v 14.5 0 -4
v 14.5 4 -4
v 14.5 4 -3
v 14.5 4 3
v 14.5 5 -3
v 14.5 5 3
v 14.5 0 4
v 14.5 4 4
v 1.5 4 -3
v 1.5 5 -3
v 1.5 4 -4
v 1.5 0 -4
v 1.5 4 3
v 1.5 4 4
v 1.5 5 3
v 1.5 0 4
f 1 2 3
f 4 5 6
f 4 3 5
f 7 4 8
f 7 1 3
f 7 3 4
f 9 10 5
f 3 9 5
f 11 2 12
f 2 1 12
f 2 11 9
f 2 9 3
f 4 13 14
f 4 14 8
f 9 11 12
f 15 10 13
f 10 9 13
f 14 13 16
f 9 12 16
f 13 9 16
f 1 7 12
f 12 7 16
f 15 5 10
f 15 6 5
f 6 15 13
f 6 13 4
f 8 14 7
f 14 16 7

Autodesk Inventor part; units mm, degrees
ref_plane "YZ Plane" through (0, 0, 0) normal (1, 0, 0) x (0, 1, 0)
ref_plane "XZ Plane" through (0, 0, 0) normal (0, 1, 0) x (-1, 0, 0)
ref_plane "XY Plane" through (0, 0, 0) normal (0, 0, 1) x (1, 0, 0)
sketch "Sketch1" plane through (0, 0, 0) normal (0, 1, 0) x (-1, 0, 0)
  line L0 (0, 4) -> (-20, 4)
  line L1 (-20, 4) -> (-20, -4)
  line L2 (-20, -4) -> (0, -4)
  circle A0 centre (-20, 0) radius 4
  circle A1 centre (-20, 0) radius 2.5
  line L3 (-20, -4) -> (-30, -4)
  line L4 (-30, -4) -> (-30, 4)
  line L5 (-30, 4) -> (-20, 4)
  line L6 (-20, 4) -> (-20, -4)
  circle A2 centre (4, 0) radius 4
  circle A3 centre (4, 0) radius 2.5
  line L7 (0, 4) -> (4, 4)
  line L8 (4, -4) -> (0, -4)
  line L9 (0, 0) -> (-1.5, 0)
  line L10 (-1.5, 0) -> (-14.5, 0)
  line L11 (-14.5, 0) -> (-14.5, -4)
  line L12 (-1.5, 0) -> (-1.5, -4)
  line L13 (-1.5, 0) -> (-1.5, 4)
  line L14 (-14.5, 0) -> (-14.5, 4)
  dimension "d0" = 20
  dimension "d1" = 5
  dimension "d2" = 10
  dimension "d3" = 5
  dimension "d4" = 1.5
  dimension "d5" = 13
extrude "Extrusion1" add sketch "Sketch1" along normal blind 5 contours L13 L10 L14 L0 | L12 L2 L11 L10
sketch "Sketch2" plane through (0, 5, 0) normal (0, 1, 0) x (1, 0, 0)
  line L0 (14.5, 4) -> (1.5, 4) projected
  line L1 (1.5, 4) -> (1.5, 3)
  line L2 (1.5, 4) -> (1.5, -4) projected
  line L3 (1.5, 3) -> (1.5, -3)
  line L4 (1.5, 3) -> (14.5, 3)
  line L5 (14.5, 3) -> (14.5, -3)
  line L6 (14.5, -4) -> (14.5, 4) projected
  line L7 (1.5, -3) -> (14.5, -3)
  line L8 (1.5, -4) -> (14.5, -4) projected
  line L9 (14.5, -4) -> (1.5, -4)
  point P0 (0, 0)
  dimension "d8" = 1
  dimension "d9" = 6
extrude "Extrusion2" cut sketch "Sketch2" against normal blind 1 contours L6 L4 L1 L0 | L6 L8 L2 L7
properties part number "sensorMount"
